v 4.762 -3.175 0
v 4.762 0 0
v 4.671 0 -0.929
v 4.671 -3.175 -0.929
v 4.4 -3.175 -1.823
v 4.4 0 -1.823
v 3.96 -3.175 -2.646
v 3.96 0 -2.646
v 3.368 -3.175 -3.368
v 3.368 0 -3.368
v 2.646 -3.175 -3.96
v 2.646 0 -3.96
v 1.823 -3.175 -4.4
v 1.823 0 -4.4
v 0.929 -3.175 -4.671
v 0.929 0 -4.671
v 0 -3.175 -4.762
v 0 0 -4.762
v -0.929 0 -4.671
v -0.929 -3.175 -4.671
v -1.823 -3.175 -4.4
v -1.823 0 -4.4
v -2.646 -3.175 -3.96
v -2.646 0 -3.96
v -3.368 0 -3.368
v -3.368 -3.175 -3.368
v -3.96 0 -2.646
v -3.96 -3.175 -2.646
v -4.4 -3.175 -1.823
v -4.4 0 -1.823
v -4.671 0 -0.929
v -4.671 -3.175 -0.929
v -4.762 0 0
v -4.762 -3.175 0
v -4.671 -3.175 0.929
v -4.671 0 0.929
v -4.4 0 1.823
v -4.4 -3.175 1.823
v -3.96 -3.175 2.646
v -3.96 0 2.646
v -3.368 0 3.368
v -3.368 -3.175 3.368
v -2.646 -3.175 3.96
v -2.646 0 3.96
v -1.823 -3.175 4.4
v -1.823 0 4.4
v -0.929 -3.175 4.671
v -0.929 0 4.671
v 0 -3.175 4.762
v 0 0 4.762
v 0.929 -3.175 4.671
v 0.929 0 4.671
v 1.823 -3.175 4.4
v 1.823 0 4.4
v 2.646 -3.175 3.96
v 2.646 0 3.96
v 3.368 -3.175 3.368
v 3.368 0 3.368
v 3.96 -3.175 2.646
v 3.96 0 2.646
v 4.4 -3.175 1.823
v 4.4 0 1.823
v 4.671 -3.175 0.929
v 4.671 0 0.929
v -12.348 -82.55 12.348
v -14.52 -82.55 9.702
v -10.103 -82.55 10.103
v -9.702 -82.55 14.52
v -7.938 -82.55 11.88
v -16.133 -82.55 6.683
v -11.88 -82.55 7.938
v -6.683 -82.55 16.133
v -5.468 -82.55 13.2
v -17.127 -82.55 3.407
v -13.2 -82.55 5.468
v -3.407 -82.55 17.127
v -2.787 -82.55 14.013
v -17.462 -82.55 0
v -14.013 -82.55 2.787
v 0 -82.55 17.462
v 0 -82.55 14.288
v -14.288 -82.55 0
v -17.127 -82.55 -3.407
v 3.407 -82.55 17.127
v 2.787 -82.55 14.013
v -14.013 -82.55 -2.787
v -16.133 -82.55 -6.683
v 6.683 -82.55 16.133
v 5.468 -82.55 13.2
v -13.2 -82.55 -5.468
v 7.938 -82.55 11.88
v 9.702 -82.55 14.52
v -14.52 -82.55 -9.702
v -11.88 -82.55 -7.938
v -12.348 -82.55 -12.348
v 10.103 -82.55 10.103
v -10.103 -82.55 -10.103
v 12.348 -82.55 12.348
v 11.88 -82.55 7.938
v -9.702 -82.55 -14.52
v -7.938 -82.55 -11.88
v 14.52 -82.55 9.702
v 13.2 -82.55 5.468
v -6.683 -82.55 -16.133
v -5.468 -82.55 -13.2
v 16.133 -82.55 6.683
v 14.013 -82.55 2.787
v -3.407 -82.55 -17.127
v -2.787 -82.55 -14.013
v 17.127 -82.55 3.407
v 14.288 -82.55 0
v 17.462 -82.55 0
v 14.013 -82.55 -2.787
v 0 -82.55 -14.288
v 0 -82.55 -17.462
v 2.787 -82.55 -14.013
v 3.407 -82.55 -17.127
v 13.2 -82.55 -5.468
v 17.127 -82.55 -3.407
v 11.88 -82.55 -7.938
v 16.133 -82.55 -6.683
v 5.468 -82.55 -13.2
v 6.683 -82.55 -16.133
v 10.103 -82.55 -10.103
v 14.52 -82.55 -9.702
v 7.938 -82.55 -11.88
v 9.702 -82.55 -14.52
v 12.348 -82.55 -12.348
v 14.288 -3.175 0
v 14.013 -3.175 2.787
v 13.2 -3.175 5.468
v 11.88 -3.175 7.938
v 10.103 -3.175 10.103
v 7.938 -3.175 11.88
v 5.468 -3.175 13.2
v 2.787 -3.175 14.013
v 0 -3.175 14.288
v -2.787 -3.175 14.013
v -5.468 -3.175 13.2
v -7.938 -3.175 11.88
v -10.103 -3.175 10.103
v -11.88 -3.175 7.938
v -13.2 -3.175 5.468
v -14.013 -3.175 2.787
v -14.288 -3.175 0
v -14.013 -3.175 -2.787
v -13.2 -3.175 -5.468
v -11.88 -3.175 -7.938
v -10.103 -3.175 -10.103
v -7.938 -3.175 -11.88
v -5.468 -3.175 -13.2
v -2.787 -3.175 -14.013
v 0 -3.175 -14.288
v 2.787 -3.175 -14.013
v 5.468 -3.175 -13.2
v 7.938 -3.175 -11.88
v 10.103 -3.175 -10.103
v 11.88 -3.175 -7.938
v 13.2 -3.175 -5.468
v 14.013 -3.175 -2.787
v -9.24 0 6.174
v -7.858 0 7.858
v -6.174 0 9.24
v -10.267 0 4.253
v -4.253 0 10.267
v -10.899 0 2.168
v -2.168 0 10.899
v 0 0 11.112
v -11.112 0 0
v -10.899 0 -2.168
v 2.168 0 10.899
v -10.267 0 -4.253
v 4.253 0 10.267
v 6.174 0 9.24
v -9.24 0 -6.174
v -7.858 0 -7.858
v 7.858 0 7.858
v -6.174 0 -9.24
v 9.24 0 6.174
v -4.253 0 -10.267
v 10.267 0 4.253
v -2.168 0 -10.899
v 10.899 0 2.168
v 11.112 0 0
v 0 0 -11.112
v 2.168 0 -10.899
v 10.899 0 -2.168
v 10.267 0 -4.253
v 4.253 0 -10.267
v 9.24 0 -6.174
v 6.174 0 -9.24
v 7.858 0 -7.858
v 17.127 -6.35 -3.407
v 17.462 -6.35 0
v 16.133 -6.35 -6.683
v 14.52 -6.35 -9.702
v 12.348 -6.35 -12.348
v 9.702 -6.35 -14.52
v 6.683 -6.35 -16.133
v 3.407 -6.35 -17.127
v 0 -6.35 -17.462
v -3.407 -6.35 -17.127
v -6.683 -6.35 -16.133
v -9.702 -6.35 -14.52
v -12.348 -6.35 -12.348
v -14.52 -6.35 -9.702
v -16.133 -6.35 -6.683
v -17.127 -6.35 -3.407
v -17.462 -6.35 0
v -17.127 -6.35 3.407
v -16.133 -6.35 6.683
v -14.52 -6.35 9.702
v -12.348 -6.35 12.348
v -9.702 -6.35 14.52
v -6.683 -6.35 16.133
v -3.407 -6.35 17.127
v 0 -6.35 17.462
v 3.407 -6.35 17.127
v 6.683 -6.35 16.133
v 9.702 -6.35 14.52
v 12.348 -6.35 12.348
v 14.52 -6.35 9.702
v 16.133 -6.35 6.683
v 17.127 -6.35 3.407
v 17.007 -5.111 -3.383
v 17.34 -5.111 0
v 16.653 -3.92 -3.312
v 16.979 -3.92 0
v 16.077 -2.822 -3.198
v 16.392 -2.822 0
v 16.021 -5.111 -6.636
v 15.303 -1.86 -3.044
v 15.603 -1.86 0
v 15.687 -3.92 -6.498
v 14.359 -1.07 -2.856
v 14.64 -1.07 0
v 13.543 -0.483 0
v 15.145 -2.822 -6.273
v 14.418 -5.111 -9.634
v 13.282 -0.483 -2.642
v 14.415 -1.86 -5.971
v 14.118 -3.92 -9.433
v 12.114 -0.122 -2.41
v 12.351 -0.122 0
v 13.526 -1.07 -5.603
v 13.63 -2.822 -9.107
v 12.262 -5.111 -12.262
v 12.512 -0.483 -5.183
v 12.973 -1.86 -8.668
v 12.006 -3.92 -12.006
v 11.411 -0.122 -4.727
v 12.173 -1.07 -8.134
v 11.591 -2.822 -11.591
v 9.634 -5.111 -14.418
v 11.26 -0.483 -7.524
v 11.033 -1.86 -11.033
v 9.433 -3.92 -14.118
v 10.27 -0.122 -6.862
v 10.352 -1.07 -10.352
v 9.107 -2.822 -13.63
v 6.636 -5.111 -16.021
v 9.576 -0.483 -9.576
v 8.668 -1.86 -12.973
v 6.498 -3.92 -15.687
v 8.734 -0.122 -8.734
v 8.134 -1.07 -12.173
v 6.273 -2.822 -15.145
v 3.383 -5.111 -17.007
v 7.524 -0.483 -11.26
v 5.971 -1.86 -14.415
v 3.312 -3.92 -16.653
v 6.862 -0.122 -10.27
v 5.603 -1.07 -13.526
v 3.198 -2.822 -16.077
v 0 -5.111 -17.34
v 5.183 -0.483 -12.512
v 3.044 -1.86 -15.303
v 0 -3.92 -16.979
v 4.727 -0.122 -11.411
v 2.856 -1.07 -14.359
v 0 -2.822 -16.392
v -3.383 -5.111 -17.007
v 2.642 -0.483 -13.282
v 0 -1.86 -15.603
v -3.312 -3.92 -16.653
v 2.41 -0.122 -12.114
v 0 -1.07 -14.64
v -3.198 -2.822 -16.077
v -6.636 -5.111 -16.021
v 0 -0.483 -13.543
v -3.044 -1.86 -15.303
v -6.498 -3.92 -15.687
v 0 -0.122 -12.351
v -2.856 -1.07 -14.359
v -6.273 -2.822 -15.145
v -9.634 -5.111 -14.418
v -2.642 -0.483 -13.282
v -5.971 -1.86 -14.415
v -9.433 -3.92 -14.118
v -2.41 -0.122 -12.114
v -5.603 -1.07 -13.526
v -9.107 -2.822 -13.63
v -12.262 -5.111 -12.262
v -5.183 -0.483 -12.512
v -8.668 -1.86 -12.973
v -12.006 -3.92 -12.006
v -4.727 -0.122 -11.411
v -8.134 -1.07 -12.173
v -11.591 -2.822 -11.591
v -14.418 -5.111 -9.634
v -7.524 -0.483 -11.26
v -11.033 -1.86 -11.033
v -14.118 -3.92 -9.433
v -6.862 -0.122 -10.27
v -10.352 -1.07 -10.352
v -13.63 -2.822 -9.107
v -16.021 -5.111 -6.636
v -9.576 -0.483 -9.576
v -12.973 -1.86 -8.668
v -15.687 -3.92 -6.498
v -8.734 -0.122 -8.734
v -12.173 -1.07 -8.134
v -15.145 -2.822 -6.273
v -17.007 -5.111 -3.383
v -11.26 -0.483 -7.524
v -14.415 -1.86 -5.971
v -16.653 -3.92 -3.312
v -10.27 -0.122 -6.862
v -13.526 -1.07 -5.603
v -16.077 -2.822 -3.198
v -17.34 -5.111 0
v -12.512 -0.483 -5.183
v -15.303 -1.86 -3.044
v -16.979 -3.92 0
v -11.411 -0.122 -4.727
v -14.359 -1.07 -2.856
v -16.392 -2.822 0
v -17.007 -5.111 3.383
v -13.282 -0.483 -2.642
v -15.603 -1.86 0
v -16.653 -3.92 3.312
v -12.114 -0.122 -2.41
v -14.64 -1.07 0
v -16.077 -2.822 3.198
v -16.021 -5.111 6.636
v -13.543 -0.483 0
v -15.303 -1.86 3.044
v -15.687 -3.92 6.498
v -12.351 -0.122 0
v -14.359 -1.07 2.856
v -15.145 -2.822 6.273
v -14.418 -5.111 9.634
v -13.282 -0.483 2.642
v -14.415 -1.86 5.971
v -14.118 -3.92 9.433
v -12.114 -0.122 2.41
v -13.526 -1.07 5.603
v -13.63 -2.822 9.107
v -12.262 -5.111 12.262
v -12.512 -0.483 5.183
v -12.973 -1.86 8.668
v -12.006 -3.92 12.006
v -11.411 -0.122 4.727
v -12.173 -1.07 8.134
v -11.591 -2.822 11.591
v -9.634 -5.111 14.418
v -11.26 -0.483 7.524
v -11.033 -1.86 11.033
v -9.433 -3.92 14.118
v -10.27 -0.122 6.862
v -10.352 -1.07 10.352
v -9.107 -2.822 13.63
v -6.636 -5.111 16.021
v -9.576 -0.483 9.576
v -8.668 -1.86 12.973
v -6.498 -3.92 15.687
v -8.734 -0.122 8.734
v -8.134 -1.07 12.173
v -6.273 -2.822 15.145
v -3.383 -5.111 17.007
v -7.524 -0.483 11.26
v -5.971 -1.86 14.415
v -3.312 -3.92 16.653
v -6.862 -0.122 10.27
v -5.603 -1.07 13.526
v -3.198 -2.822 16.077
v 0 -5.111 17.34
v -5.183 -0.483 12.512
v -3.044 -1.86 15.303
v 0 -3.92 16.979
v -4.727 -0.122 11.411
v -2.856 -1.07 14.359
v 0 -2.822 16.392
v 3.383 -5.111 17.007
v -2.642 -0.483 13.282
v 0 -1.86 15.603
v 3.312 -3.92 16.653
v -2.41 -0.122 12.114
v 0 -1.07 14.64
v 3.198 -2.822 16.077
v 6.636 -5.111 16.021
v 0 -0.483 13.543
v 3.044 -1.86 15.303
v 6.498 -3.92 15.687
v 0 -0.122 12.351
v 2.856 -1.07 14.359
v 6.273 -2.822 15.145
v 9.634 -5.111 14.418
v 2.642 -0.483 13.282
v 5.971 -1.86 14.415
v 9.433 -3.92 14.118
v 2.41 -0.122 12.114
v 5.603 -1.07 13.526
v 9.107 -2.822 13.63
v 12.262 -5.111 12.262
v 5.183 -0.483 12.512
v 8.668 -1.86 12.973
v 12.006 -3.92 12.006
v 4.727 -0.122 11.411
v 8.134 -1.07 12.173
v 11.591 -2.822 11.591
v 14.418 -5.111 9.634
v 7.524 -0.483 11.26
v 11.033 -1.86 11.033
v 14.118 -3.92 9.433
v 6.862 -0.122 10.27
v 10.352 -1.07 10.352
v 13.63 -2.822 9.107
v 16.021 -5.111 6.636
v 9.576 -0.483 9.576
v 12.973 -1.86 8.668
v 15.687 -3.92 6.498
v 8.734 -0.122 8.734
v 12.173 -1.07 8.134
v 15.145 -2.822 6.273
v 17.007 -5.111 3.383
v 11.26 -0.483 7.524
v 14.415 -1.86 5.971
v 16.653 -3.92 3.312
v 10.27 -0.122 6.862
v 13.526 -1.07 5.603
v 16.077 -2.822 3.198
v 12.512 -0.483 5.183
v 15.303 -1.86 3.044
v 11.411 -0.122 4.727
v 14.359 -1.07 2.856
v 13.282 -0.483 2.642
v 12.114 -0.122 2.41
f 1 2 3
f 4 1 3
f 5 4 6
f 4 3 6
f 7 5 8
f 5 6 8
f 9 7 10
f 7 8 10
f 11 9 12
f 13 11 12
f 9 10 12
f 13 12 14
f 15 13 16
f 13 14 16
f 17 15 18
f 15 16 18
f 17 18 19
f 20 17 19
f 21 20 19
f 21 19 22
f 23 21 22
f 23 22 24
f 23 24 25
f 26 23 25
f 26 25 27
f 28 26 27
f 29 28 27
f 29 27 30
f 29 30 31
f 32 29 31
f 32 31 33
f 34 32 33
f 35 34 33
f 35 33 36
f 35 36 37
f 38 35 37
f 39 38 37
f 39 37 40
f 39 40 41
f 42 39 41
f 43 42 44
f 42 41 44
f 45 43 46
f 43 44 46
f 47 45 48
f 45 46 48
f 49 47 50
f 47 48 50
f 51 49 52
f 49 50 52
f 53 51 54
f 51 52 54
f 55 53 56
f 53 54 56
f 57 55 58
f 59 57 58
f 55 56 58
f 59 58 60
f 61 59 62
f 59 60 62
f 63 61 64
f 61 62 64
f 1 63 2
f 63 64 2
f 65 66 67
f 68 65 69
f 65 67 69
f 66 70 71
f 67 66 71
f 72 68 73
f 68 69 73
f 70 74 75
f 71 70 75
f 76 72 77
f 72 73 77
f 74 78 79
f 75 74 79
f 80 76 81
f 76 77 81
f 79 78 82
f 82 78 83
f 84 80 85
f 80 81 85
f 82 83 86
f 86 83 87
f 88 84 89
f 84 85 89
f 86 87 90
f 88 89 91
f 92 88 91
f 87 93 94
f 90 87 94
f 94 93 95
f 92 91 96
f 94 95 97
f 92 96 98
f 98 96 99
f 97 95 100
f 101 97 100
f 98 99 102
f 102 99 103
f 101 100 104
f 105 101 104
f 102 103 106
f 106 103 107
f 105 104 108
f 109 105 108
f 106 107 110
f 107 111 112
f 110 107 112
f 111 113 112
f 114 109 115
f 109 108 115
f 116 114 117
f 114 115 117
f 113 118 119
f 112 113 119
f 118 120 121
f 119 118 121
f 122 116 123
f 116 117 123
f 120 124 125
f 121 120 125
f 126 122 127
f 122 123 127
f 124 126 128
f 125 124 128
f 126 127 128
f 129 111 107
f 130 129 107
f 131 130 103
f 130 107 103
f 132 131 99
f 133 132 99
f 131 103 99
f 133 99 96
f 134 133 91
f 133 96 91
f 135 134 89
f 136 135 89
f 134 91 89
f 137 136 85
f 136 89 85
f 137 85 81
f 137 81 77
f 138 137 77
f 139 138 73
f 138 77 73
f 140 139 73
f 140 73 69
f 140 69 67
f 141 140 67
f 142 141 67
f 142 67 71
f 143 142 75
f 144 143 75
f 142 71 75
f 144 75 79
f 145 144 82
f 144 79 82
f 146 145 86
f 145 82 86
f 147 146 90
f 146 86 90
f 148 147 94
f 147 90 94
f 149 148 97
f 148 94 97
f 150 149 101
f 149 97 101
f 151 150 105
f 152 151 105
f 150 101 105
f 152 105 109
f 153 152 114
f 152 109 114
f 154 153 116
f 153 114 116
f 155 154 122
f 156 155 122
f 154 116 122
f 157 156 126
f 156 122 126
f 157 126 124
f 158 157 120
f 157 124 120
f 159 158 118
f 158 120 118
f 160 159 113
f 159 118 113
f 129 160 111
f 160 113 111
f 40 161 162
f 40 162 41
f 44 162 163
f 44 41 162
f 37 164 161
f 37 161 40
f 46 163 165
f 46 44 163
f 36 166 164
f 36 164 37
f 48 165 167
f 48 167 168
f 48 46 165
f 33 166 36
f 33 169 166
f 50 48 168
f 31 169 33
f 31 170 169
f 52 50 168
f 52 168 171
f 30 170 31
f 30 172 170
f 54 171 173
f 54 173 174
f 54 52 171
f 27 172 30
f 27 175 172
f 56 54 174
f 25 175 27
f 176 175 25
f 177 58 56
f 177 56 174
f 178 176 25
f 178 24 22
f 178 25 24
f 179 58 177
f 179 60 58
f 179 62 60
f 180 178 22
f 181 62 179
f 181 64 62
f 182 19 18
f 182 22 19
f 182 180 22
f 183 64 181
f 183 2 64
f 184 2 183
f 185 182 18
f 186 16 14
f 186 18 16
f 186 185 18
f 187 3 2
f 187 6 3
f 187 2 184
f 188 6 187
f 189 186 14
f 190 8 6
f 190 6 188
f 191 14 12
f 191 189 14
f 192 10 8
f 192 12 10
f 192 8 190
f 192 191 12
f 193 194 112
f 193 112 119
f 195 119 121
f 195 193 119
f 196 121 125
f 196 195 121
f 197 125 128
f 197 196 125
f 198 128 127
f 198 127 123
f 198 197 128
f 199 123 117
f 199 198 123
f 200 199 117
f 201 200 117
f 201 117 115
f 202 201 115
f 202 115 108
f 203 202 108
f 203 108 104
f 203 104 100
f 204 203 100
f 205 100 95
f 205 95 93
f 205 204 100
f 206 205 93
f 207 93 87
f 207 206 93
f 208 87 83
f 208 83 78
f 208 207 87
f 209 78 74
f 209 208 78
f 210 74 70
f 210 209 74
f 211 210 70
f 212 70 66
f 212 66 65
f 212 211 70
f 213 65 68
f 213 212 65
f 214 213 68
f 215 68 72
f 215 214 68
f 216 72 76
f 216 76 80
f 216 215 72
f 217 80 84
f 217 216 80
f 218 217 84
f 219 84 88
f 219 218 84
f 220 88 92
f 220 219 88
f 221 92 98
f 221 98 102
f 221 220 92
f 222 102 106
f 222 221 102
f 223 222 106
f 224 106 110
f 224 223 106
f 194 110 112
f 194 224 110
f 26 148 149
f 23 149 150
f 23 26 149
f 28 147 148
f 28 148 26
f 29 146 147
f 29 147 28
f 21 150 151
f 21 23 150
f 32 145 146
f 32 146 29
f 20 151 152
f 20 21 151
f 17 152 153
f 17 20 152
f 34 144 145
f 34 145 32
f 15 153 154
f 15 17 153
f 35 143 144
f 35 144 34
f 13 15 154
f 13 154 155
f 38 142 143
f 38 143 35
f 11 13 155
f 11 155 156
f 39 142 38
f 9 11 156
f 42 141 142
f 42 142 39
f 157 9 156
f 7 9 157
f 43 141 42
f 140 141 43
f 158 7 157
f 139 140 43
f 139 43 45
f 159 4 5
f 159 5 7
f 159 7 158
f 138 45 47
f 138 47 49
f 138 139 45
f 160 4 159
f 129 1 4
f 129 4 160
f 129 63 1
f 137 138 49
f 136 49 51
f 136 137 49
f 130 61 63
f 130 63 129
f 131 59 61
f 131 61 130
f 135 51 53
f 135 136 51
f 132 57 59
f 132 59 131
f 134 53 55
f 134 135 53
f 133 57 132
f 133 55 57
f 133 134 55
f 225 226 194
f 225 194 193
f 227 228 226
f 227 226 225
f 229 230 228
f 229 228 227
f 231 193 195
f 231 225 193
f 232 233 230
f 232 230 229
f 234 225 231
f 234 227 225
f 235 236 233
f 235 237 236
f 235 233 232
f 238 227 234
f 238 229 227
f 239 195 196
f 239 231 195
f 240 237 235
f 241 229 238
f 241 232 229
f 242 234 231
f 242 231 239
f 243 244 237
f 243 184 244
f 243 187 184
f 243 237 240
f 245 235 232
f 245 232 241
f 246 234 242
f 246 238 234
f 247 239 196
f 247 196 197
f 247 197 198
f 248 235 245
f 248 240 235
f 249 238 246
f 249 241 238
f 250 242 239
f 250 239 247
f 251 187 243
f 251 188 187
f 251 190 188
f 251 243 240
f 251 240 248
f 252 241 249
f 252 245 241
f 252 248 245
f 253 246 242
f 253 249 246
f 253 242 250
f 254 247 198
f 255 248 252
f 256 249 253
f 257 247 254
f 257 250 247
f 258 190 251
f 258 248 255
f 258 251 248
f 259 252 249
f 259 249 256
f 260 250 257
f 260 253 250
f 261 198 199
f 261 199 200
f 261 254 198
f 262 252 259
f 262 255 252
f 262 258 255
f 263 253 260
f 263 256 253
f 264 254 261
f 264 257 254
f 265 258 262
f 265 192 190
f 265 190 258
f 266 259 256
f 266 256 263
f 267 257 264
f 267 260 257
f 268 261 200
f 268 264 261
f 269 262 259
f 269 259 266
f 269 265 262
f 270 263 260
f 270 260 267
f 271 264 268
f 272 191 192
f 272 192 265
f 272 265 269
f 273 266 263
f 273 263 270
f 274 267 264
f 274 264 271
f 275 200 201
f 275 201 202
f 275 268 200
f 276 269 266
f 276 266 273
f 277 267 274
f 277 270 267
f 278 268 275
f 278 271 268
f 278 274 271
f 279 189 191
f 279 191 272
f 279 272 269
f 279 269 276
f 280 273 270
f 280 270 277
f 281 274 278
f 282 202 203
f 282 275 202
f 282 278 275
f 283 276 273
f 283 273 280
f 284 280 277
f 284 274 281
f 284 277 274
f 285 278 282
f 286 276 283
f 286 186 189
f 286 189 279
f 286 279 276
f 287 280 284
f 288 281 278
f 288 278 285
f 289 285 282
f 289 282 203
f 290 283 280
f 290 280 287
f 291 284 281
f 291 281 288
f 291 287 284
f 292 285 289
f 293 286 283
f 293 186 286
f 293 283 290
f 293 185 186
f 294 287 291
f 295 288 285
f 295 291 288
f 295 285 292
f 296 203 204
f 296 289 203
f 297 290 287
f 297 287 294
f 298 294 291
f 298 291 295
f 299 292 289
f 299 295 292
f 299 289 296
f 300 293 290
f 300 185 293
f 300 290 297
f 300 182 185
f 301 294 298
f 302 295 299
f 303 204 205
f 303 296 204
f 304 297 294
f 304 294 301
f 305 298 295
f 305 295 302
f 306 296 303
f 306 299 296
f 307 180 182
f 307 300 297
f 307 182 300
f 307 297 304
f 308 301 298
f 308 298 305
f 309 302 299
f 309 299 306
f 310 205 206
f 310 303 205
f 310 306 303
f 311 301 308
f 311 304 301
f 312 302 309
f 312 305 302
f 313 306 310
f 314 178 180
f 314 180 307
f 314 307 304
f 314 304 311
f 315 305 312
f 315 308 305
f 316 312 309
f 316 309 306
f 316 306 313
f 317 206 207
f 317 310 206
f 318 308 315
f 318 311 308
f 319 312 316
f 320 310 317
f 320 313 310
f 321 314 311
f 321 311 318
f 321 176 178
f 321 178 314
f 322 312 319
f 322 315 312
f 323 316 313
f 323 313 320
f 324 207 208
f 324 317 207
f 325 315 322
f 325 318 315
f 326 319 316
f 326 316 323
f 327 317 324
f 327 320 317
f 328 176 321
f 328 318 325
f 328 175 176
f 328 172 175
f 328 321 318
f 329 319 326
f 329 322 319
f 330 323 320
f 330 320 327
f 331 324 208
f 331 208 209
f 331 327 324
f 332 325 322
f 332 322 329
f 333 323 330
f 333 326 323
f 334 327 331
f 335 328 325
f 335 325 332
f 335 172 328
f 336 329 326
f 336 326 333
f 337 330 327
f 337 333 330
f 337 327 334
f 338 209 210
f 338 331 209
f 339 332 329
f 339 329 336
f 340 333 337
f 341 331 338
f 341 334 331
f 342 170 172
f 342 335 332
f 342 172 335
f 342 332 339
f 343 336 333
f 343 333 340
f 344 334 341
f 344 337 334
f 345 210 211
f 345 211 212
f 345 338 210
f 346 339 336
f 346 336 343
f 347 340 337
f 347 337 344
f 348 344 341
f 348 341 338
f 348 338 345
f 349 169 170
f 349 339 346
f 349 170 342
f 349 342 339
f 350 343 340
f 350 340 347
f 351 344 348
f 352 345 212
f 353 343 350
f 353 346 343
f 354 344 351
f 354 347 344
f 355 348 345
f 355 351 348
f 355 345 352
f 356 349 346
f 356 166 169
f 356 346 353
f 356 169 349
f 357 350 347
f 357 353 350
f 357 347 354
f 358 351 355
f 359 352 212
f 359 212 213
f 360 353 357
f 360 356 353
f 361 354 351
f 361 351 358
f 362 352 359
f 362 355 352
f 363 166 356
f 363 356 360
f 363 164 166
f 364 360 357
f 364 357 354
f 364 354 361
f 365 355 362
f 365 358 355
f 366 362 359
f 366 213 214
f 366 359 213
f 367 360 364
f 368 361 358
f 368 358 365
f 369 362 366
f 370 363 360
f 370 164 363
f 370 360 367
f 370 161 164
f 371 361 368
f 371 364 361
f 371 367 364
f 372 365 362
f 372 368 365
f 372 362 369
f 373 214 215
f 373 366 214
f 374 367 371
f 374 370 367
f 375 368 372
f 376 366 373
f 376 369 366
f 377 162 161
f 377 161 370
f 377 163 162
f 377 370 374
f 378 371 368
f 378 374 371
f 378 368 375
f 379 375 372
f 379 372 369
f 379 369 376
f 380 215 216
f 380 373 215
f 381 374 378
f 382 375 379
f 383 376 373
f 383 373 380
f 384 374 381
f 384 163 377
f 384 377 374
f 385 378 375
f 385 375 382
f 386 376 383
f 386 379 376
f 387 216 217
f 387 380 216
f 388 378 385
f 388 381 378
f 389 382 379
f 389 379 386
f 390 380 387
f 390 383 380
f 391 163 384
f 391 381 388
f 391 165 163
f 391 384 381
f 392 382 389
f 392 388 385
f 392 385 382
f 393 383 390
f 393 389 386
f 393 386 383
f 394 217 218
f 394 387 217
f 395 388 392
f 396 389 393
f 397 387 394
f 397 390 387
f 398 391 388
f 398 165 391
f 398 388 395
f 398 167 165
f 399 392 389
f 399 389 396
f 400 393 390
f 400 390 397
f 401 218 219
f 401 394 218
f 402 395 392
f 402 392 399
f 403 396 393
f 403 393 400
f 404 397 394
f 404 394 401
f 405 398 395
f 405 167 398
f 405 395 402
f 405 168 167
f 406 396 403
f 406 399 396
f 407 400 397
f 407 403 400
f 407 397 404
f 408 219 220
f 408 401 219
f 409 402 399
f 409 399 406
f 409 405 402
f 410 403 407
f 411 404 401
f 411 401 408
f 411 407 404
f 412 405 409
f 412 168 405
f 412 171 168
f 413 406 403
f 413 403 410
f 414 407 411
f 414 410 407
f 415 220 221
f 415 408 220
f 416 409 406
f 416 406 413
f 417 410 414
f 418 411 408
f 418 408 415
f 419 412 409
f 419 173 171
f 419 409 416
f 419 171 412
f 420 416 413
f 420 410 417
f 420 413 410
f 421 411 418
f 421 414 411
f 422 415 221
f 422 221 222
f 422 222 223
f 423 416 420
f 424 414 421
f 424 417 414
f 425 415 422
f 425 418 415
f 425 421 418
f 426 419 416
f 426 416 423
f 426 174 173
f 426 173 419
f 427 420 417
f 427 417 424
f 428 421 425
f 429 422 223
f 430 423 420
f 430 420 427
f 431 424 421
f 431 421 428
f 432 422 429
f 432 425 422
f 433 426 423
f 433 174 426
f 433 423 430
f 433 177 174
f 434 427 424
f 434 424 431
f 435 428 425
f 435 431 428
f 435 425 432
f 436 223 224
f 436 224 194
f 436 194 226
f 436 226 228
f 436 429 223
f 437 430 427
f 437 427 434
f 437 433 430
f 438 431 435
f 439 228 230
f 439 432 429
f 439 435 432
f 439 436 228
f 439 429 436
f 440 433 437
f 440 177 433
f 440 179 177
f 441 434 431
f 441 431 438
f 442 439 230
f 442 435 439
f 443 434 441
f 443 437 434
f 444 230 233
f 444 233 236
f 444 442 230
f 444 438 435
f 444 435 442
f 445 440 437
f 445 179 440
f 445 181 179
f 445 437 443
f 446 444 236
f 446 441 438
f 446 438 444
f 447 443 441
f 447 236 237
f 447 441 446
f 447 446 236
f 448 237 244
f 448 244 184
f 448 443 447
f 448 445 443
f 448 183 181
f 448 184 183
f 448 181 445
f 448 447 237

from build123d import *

# Parameters (mm, degrees)
SKETCH1_R           = 17.4625
BOSS_EXTRUDE1_DEPTH = 82.55
SKETCH2_R           = 14.2875
CUT_EXTRUDE1_DEPTH  = 79.375
SKETCH3_R           = 4.7625
CUT_EXTRUDE2_DEPTH  = 83.55
FILLET2_R           = 6.35


with BuildPart() as part:
    # Sketch1 → Boss-Extrude1 (new body)
    with BuildSketch(Plane(origin=(0, 0, 0), x_dir=(1, 0, 0), z_dir=(0, 1, 0))):
        Circle(SKETCH1_R)
    extrude(amount=-BOSS_EXTRUDE1_DEPTH)

    # Sketch2 → Cut-Extrude1 (cut)
    with BuildSketch(Plane.XZ.offset(82.55)):
        Circle(SKETCH2_R)
    extrude(amount=-CUT_EXTRUDE1_DEPTH, mode=Mode.SUBTRACT)

    # Sketch3 → Cut-Extrude2 (cut, through all)
    with BuildSketch(Plane(origin=(0, 0, 0), x_dir=(1, 0, 0), z_dir=(0, 1, 0))):
        Circle(SKETCH3_R)
    extrude(amount=-CUT_EXTRUDE2_DEPTH, mode=Mode.SUBTRACT)

    # Fillet2
    fillet2_edges = [part.edges().sort_by_distance(p)[0] for p in [
        (-17.4625, 0, 0),
    ]]
    fillet(fillet2_edges, radius=FILLET2_R)


solid = part.part
